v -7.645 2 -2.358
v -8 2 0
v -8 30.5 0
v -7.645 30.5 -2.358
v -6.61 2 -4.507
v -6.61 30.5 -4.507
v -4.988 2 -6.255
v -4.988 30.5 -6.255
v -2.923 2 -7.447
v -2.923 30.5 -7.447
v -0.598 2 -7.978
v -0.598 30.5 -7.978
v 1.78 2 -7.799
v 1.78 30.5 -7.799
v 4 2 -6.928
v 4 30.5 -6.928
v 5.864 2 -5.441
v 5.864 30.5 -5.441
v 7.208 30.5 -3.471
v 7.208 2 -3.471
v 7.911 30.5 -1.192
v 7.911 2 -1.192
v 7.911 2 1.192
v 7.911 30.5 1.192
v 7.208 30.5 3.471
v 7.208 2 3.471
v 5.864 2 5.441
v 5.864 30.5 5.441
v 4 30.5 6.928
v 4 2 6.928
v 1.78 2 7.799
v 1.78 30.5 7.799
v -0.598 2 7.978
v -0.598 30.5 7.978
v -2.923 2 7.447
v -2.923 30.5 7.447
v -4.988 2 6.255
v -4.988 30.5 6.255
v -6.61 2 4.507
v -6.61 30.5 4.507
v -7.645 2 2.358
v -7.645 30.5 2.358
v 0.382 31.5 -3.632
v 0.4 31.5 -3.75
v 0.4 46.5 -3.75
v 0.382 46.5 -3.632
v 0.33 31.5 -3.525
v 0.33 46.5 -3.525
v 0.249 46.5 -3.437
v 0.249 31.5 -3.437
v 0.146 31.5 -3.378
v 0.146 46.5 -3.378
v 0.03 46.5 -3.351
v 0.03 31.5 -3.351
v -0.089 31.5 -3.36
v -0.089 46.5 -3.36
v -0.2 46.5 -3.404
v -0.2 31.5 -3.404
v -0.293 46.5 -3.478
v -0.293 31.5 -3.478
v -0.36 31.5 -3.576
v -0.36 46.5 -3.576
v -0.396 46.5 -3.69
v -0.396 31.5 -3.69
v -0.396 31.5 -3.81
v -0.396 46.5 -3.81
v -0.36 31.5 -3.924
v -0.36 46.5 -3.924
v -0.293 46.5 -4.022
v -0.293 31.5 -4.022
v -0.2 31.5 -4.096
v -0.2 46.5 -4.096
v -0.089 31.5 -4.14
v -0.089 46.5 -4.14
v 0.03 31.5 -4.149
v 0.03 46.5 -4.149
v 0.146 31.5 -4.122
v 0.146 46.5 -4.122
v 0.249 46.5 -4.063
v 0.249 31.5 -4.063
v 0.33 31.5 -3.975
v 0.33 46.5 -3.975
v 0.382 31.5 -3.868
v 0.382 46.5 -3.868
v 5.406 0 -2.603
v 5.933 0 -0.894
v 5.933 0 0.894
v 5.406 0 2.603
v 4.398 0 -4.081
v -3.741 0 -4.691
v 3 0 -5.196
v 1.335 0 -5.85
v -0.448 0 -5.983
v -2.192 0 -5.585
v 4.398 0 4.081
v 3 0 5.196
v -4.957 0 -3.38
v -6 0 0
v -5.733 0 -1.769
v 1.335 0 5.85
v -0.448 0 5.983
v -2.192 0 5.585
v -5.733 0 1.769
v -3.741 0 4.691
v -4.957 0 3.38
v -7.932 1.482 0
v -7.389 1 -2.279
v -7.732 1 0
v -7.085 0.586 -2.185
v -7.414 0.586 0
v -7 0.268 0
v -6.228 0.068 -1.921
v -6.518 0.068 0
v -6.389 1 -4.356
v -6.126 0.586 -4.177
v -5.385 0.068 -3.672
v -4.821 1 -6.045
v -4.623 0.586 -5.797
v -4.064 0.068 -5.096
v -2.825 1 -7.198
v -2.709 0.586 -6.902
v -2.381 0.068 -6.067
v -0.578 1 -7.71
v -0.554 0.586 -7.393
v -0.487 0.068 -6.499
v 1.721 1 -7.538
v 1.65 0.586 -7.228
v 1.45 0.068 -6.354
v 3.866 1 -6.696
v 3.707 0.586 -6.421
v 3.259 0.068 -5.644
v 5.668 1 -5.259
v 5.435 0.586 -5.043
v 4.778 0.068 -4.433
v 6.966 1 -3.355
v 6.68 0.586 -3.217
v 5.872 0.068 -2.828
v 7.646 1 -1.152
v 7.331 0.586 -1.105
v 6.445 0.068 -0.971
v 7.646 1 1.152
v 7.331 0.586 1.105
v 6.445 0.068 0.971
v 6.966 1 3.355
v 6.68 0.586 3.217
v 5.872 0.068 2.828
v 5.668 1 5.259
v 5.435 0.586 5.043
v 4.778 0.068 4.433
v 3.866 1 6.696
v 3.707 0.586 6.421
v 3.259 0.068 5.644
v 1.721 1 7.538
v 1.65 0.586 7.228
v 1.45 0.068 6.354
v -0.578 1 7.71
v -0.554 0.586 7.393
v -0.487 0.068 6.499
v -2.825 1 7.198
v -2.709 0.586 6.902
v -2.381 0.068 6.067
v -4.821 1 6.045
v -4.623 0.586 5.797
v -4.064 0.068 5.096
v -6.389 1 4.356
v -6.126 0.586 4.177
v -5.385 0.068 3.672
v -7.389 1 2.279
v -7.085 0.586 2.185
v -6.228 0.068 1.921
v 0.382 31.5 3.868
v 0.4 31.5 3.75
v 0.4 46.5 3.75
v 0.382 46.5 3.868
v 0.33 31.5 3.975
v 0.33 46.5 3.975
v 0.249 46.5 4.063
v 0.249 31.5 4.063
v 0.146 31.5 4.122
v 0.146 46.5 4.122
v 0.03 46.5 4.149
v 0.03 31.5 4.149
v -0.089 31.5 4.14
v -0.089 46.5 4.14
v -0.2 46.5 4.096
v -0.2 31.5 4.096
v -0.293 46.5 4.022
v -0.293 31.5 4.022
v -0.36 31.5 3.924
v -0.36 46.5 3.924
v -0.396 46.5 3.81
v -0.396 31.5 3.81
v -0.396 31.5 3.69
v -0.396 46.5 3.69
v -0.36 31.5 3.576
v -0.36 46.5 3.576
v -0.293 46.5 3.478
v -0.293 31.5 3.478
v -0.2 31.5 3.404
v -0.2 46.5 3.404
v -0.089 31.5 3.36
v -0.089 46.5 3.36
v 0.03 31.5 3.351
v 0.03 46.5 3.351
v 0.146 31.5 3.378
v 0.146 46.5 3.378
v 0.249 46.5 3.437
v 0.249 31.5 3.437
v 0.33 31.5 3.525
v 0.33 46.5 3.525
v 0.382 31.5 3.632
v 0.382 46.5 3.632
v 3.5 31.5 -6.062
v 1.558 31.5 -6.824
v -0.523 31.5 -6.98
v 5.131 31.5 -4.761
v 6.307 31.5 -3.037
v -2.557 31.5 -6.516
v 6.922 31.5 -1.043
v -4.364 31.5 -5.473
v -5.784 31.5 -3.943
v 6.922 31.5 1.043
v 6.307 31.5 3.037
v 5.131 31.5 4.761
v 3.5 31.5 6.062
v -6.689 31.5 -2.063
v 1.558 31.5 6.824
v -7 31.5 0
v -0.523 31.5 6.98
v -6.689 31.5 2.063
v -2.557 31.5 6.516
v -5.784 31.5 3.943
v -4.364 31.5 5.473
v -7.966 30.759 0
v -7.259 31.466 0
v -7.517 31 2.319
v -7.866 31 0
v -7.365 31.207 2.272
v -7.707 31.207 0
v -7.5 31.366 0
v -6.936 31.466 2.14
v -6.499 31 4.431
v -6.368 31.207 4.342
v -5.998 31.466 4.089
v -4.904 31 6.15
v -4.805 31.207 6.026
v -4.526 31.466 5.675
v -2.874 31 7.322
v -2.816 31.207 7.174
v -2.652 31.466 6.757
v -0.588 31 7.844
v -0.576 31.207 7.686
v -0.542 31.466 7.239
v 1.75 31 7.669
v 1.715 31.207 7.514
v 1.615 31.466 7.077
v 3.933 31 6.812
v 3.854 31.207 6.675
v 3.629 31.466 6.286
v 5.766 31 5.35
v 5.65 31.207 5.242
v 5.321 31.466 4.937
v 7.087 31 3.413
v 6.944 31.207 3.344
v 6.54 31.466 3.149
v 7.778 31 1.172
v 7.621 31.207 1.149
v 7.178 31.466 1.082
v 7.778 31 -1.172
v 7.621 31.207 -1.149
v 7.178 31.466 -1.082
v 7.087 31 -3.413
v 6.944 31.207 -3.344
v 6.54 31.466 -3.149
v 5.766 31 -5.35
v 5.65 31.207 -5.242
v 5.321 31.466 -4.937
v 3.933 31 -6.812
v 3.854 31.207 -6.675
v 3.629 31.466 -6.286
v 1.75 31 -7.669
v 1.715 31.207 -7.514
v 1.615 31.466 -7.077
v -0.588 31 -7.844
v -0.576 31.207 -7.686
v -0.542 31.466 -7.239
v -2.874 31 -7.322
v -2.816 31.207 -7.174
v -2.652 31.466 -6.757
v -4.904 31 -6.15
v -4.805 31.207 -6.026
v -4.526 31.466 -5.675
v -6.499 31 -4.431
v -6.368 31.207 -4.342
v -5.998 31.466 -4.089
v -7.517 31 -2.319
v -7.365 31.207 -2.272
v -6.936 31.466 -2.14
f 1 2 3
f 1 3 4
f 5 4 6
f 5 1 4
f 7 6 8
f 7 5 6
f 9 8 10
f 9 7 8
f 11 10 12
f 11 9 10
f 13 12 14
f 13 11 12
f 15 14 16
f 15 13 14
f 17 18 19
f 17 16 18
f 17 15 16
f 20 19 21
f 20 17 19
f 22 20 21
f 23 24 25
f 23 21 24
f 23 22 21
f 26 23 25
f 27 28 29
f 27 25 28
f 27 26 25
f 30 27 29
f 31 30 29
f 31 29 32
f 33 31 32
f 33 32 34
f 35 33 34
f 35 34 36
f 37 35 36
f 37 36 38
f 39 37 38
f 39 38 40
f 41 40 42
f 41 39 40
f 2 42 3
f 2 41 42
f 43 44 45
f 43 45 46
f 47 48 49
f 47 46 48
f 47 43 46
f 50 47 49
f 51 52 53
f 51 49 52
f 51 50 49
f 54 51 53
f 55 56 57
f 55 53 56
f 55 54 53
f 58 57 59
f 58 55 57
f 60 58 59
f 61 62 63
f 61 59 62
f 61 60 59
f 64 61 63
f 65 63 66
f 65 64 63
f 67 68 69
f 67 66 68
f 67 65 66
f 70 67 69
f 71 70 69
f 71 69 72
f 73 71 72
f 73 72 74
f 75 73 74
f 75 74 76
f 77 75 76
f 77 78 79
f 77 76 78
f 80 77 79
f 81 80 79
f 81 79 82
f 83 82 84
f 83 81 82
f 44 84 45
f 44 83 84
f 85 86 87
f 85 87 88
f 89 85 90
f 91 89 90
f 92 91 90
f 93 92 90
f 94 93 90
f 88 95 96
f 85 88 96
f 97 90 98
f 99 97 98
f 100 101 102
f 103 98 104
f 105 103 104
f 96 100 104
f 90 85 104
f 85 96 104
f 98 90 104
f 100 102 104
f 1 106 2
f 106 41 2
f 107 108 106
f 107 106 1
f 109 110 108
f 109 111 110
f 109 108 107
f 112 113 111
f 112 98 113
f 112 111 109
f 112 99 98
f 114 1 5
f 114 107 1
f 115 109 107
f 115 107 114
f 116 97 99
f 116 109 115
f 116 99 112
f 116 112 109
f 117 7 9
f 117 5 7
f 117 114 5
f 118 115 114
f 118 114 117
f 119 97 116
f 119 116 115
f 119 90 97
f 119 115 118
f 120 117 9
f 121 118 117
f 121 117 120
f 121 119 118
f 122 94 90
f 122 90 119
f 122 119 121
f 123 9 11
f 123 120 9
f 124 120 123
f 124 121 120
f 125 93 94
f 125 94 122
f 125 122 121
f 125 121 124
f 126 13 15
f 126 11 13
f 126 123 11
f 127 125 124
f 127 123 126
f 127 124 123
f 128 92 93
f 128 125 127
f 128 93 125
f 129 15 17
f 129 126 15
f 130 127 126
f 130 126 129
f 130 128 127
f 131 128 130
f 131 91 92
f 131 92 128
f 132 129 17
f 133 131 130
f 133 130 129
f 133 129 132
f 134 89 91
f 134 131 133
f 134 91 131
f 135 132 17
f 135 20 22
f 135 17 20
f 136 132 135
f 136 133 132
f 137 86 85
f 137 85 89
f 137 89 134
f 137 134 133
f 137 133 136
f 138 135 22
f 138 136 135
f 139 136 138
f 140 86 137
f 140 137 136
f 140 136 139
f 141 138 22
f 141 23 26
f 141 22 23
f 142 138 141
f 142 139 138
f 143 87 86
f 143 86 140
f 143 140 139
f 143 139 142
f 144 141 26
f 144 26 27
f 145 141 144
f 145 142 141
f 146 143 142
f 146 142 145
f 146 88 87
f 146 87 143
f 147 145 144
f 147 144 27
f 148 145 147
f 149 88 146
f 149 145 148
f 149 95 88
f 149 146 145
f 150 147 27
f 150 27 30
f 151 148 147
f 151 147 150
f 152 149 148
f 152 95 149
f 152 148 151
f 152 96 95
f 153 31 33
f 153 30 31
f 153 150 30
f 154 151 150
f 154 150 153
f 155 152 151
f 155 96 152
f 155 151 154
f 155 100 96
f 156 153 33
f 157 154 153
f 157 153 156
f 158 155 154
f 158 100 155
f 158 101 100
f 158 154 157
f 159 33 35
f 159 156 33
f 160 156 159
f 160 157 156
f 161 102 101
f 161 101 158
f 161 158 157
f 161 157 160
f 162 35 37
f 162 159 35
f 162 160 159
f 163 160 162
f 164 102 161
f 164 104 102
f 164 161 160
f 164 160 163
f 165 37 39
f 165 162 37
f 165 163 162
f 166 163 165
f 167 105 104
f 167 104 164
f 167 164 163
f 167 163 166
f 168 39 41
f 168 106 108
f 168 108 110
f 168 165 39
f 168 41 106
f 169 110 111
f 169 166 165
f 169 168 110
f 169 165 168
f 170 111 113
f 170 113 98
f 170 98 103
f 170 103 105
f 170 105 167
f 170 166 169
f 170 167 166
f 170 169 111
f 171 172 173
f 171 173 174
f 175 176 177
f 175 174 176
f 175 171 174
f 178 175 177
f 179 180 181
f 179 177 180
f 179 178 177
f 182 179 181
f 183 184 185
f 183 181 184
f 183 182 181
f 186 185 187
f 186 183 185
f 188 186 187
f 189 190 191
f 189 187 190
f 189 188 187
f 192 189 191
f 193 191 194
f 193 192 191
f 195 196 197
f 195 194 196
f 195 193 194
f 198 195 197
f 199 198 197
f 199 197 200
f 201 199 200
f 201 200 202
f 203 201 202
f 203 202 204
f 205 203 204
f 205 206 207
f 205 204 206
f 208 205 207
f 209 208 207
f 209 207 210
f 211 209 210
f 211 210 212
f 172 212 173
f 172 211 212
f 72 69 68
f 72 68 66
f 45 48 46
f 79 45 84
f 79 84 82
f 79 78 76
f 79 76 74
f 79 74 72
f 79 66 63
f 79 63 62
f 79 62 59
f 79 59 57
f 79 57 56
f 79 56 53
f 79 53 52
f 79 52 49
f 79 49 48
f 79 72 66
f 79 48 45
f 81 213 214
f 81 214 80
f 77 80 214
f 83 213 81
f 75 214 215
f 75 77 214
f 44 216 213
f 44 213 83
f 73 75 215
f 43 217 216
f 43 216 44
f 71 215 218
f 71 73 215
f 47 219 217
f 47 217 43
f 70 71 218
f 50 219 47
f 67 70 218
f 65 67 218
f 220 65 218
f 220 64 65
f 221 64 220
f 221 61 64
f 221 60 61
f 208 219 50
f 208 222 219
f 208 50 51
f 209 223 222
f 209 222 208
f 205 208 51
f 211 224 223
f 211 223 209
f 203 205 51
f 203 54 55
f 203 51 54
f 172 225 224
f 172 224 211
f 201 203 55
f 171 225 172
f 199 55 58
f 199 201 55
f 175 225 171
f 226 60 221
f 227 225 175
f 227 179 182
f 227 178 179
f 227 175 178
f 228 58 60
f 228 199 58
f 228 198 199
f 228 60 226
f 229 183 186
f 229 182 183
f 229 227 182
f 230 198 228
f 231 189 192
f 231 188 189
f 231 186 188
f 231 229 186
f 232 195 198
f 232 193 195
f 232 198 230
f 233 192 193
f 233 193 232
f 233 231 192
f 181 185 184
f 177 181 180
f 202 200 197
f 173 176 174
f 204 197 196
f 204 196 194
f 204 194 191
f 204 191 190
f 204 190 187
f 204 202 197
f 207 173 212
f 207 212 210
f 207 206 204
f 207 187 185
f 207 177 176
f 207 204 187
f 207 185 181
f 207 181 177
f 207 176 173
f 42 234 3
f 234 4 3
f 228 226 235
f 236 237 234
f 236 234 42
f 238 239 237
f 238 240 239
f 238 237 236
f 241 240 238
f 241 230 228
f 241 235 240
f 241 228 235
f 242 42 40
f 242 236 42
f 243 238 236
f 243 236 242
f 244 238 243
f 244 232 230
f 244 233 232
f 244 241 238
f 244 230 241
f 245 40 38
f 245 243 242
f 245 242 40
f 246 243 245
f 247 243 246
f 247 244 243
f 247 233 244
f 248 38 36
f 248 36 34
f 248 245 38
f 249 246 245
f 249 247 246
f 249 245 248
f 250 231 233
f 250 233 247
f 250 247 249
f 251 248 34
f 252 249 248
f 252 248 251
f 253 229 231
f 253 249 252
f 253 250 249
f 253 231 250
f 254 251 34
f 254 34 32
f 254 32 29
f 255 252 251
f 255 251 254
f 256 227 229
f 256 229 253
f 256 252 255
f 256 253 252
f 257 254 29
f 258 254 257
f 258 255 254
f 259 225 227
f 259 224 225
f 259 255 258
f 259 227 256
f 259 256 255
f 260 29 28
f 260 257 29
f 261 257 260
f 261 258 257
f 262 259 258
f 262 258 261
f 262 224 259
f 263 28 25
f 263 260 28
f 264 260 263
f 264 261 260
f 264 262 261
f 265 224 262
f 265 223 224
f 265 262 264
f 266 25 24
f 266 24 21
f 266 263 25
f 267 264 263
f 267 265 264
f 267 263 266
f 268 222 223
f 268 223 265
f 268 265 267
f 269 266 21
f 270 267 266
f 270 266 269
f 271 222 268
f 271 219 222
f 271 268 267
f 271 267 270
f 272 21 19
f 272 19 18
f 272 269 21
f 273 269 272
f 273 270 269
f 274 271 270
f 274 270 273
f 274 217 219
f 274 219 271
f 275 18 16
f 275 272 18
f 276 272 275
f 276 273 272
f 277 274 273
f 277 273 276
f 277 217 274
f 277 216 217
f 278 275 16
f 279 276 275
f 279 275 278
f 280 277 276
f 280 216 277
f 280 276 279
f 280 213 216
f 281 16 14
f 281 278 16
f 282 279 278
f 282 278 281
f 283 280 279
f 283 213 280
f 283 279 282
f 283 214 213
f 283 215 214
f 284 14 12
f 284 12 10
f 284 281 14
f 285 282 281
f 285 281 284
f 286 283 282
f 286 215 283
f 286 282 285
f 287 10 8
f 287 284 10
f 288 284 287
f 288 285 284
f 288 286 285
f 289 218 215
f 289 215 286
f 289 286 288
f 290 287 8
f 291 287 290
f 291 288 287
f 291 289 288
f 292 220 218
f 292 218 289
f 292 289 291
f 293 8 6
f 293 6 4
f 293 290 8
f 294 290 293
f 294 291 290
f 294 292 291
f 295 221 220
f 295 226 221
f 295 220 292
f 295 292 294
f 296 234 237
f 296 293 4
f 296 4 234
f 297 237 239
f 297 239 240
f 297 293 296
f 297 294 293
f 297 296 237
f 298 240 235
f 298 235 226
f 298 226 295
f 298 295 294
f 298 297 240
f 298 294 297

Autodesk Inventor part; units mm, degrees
ref_plane "YZ Plane" through (0, 0, 0) normal (1, 0, 0) x (0, 1, 0)
ref_plane "XZ Plane" through (0, 0, 0) normal (0, 1, 0) x (-1, 0, 0)
ref_plane "XY Plane" through (0, 0, 0) normal (0, 0, 1) x (1, 0, 0)
sketch "Sketch1" plane through (0, 0, 0) normal (0, 1, 0) x (-1, 0, 0)
  circle A0 centre (0, 0) radius 8
  dimension "d0" = 16
extrude "Extrusion1" add sketch "Sketch1" along normal blind 31.5
sketch "Sketch2" plane through (0, 31.5, 0) normal (0, 1, 0) x (1, 0, 0)
  circle A0 centre (0, 0) radius 8 projected
  circle A1 centre (0, 3.75) radius 0.4
  circle A2 centre (0, -3.75) radius 0.4
  dimension "d3" = 0.8
  dimension "d4" = 0.8
  dimension "d5" = 3.75
  dimension "d6" = 3.75
extrude "Extrusion2" add sketch "Sketch2" along normal blind 15 contours A1 | A2
fillet "Fillet1" radius 2 1 edges at (8, 0, 0)
fillet "Fillet2" radius 1 1 edges at (8, 31.5, 0)
properties part number "Capacitor"
